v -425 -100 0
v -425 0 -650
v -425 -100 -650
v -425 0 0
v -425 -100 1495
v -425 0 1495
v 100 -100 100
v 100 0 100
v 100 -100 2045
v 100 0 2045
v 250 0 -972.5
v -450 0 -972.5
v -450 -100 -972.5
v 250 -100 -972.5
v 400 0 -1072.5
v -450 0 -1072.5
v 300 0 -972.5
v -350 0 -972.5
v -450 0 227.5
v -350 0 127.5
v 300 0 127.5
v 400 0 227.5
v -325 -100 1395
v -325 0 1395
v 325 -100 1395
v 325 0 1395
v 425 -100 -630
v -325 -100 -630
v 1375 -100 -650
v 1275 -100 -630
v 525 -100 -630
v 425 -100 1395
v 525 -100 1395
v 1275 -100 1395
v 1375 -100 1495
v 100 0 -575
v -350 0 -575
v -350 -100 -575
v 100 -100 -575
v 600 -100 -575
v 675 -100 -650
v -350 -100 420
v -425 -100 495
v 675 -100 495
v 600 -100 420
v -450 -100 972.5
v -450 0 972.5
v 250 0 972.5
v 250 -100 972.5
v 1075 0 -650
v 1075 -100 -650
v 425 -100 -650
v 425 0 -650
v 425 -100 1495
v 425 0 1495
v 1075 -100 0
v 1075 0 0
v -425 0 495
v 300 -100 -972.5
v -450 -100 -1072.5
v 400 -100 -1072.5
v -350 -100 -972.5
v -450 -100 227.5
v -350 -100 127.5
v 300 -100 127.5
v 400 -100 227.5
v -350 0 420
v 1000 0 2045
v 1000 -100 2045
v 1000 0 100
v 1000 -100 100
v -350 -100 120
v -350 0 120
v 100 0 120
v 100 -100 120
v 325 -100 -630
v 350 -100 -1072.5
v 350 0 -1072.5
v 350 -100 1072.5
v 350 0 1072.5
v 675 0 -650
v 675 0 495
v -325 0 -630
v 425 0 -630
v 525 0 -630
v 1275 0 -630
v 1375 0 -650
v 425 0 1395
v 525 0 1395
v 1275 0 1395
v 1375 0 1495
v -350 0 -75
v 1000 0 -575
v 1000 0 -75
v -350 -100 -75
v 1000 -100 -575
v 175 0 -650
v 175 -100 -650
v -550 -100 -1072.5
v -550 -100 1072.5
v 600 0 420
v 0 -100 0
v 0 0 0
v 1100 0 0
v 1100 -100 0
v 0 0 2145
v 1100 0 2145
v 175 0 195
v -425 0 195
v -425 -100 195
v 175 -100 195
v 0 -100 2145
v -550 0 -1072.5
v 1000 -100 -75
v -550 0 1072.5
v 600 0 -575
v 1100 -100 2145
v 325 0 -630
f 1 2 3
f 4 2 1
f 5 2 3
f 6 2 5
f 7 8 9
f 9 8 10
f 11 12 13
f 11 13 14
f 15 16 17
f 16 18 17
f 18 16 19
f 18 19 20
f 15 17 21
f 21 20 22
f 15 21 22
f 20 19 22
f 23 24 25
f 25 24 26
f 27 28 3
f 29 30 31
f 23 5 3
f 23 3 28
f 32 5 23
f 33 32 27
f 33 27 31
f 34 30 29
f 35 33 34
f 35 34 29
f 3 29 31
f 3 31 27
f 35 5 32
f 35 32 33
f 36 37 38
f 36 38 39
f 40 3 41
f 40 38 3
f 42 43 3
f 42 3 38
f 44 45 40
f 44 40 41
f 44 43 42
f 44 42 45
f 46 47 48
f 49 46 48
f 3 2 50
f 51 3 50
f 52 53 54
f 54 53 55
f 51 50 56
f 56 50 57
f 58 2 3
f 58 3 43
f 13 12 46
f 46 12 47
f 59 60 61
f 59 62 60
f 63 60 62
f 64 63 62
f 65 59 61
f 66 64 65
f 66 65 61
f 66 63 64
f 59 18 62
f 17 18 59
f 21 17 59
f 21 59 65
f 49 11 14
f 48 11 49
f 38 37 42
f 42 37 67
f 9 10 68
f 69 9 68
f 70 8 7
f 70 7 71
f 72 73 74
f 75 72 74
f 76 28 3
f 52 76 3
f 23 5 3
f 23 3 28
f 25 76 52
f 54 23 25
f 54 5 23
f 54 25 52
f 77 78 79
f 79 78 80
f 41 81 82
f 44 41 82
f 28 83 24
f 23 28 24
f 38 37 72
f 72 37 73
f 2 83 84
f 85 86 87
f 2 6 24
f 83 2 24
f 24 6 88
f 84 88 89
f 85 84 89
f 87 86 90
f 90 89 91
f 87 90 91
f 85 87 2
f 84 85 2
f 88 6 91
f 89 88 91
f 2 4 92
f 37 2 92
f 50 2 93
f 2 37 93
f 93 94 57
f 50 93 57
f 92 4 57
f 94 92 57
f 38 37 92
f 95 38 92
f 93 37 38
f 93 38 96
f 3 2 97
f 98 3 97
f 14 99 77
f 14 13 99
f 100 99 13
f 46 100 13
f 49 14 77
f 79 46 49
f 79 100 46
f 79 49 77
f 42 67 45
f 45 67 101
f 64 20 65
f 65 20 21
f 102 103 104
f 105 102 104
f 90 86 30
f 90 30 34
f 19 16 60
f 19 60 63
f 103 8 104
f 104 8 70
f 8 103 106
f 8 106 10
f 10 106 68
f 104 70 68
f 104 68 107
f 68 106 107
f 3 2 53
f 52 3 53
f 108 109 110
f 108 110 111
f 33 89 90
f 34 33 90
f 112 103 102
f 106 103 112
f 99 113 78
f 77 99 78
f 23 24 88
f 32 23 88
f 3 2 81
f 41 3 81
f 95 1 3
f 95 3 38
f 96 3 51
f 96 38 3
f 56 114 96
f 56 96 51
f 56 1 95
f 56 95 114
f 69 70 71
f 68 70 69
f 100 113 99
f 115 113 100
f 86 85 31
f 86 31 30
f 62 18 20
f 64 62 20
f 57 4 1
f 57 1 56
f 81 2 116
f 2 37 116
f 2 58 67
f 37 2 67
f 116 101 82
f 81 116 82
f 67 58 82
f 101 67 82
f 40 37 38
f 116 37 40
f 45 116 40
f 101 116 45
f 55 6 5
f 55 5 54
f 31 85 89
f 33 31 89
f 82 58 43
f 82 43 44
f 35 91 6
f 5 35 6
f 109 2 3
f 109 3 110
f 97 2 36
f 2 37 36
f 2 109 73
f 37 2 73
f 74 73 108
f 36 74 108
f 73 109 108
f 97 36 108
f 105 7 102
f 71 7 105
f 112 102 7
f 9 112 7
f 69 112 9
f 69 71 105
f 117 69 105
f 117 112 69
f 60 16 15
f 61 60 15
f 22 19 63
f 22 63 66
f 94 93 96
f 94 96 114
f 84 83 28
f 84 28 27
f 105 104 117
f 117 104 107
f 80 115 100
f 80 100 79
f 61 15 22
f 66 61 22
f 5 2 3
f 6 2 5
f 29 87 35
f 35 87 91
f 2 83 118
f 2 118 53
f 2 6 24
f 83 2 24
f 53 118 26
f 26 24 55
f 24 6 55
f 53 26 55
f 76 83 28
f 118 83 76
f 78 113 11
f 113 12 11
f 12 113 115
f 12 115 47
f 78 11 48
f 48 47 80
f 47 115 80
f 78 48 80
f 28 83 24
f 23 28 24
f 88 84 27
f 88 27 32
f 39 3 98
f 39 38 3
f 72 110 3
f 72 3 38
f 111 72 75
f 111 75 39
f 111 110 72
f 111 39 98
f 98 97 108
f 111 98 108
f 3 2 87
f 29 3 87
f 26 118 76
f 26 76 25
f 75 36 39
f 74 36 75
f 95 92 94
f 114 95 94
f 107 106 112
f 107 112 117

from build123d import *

# Parameters (mm, degrees)
F0_W      = 1100
F0_H      = 2145
F0_W_2    = 900
F0_H_2    = 1945
F1_DEPTH  = 100
F2_W      = 900
F2_H      = 2145
F2_W_2    = 700
F2_H_2    = 1945
F3_DEPTH  = 100
F4_W      = 850
F4_H      = 1300
F4_W_2    = 650
F4_H_2    = 1100
F5_DEPTH  = 100
F6_W      = 900
F6_H      = 2145
F6_W_2    = 750
F6_H_2    = 2025
F7_DEPTH  = 100
F8_W      = 850
F8_H      = 2145
F8_W_2    = 650
F8_H_2    = 2025
F9_DEPTH  = 100
F10_W     = 1500
F10_H     = 650
F10_W_2   = 1350
F10_H_2   = 500
F11_DEPTH = 100
F12_W     = 600
F12_H     = 845
F12_W_2   = 450
F12_H_2   = 695
F13_DEPTH = 100
F14_W     = 1100
F14_H     = 1145
F14_W_2   = 950
F14_H_2   = 995
F15_DEPTH = 100


with BuildPart() as f1:
    # F0 (on Front) → F1 (new body)
    with BuildSketch(Plane.XZ):
        with Locations((550, 1072.5)):
            Rectangle(F0_W, F0_H)
        with Locations((550, 1072.5)):
            Rectangle(F0_W_2, F0_H_2, mode=Mode.SUBTRACT)
    extrude(amount=F1_DEPTH)


with BuildPart() as f3:
    # F2 (on Front) → F3 (new body)
    with BuildSketch(Plane.XZ):
        with Locations((-100, 0)):
            Rectangle(F2_W, F2_H)
        with Locations((-100, 0)):
            Rectangle(F2_W_2, F2_H_2, mode=Mode.SUBTRACT)
    extrude(amount=F3_DEPTH)


with BuildPart() as f5:
    # F4 (on Front) → F5 (new body)
    with BuildSketch(Plane.XZ):
        with Locations((-25, -422.5)):
            Rectangle(F4_W, F4_H)
        with Locations((-25, -422.5)):
            Rectangle(F4_W_2, F4_H_2, mode=Mode.SUBTRACT)
    extrude(amount=F5_DEPTH)


with BuildPart() as f7:
    # F6 (on Front) → F7 (new body)
    with BuildSketch(Plane.XZ):
        with Locations((25, 422.5)):
            Rectangle(F6_W, F6_H)
        with Locations((50, 382.5)):
            Rectangle(F6_W_2, F6_H_2, mode=Mode.SUBTRACT)
        with Locations((925, 422.5)):
            Rectangle(F6_W, F6_H)
        with Locations((900, 382.5)):
            Rectangle(F6_W_2, F6_H_2, mode=Mode.SUBTRACT)
    extrude(amount=F7_DEPTH)


with BuildPart() as f9:
    # F8 (on Front) → F9 (new body)
    with BuildSketch(Plane.XZ):
        with Locations((0, 422.5)):
            Rectangle(F8_W, F8_H)
        with Locations((0, 382.5)):
            Rectangle(F8_W_2, F8_H_2, mode=Mode.SUBTRACT)
    extrude(amount=F9_DEPTH)


with BuildPart() as f11:
    # F10 (on Front) → F11 (new body)
    with BuildSketch(Plane.XZ):
        with Locations((325, -325)):
            Rectangle(F10_W, F10_H)
        with Locations((325, -325)):
            Rectangle(F10_W_2, F10_H_2, mode=Mode.SUBTRACT)
    extrude(amount=F11_DEPTH)


with BuildPart() as f13:
    # F12 (on Front) → F13 (new body)
    with BuildSketch(Plane.XZ):
        with Locations((-125, -227.5)):
            Rectangle(F12_W, F12_H)
        with Locations((-125, -227.5)):
            Rectangle(F12_W_2, F12_H_2, mode=Mode.SUBTRACT)
    extrude(amount=F13_DEPTH)


with BuildPart() as f15:
    # F14 (on Front) → F15 (new body)
    with BuildSketch(Plane.XZ):
        with Locations((125, -77.5)):
            Rectangle(F14_W, F14_H)
        with Locations((125, -77.5)):
            Rectangle(F14_W_2, F14_H_2, mode=Mode.SUBTRACT)
    extrude(amount=F15_DEPTH)


solid = Compound([f1.part, f3.part, f5.part, f7.part, f9.part, f11.part, f13.part, f15.part])
